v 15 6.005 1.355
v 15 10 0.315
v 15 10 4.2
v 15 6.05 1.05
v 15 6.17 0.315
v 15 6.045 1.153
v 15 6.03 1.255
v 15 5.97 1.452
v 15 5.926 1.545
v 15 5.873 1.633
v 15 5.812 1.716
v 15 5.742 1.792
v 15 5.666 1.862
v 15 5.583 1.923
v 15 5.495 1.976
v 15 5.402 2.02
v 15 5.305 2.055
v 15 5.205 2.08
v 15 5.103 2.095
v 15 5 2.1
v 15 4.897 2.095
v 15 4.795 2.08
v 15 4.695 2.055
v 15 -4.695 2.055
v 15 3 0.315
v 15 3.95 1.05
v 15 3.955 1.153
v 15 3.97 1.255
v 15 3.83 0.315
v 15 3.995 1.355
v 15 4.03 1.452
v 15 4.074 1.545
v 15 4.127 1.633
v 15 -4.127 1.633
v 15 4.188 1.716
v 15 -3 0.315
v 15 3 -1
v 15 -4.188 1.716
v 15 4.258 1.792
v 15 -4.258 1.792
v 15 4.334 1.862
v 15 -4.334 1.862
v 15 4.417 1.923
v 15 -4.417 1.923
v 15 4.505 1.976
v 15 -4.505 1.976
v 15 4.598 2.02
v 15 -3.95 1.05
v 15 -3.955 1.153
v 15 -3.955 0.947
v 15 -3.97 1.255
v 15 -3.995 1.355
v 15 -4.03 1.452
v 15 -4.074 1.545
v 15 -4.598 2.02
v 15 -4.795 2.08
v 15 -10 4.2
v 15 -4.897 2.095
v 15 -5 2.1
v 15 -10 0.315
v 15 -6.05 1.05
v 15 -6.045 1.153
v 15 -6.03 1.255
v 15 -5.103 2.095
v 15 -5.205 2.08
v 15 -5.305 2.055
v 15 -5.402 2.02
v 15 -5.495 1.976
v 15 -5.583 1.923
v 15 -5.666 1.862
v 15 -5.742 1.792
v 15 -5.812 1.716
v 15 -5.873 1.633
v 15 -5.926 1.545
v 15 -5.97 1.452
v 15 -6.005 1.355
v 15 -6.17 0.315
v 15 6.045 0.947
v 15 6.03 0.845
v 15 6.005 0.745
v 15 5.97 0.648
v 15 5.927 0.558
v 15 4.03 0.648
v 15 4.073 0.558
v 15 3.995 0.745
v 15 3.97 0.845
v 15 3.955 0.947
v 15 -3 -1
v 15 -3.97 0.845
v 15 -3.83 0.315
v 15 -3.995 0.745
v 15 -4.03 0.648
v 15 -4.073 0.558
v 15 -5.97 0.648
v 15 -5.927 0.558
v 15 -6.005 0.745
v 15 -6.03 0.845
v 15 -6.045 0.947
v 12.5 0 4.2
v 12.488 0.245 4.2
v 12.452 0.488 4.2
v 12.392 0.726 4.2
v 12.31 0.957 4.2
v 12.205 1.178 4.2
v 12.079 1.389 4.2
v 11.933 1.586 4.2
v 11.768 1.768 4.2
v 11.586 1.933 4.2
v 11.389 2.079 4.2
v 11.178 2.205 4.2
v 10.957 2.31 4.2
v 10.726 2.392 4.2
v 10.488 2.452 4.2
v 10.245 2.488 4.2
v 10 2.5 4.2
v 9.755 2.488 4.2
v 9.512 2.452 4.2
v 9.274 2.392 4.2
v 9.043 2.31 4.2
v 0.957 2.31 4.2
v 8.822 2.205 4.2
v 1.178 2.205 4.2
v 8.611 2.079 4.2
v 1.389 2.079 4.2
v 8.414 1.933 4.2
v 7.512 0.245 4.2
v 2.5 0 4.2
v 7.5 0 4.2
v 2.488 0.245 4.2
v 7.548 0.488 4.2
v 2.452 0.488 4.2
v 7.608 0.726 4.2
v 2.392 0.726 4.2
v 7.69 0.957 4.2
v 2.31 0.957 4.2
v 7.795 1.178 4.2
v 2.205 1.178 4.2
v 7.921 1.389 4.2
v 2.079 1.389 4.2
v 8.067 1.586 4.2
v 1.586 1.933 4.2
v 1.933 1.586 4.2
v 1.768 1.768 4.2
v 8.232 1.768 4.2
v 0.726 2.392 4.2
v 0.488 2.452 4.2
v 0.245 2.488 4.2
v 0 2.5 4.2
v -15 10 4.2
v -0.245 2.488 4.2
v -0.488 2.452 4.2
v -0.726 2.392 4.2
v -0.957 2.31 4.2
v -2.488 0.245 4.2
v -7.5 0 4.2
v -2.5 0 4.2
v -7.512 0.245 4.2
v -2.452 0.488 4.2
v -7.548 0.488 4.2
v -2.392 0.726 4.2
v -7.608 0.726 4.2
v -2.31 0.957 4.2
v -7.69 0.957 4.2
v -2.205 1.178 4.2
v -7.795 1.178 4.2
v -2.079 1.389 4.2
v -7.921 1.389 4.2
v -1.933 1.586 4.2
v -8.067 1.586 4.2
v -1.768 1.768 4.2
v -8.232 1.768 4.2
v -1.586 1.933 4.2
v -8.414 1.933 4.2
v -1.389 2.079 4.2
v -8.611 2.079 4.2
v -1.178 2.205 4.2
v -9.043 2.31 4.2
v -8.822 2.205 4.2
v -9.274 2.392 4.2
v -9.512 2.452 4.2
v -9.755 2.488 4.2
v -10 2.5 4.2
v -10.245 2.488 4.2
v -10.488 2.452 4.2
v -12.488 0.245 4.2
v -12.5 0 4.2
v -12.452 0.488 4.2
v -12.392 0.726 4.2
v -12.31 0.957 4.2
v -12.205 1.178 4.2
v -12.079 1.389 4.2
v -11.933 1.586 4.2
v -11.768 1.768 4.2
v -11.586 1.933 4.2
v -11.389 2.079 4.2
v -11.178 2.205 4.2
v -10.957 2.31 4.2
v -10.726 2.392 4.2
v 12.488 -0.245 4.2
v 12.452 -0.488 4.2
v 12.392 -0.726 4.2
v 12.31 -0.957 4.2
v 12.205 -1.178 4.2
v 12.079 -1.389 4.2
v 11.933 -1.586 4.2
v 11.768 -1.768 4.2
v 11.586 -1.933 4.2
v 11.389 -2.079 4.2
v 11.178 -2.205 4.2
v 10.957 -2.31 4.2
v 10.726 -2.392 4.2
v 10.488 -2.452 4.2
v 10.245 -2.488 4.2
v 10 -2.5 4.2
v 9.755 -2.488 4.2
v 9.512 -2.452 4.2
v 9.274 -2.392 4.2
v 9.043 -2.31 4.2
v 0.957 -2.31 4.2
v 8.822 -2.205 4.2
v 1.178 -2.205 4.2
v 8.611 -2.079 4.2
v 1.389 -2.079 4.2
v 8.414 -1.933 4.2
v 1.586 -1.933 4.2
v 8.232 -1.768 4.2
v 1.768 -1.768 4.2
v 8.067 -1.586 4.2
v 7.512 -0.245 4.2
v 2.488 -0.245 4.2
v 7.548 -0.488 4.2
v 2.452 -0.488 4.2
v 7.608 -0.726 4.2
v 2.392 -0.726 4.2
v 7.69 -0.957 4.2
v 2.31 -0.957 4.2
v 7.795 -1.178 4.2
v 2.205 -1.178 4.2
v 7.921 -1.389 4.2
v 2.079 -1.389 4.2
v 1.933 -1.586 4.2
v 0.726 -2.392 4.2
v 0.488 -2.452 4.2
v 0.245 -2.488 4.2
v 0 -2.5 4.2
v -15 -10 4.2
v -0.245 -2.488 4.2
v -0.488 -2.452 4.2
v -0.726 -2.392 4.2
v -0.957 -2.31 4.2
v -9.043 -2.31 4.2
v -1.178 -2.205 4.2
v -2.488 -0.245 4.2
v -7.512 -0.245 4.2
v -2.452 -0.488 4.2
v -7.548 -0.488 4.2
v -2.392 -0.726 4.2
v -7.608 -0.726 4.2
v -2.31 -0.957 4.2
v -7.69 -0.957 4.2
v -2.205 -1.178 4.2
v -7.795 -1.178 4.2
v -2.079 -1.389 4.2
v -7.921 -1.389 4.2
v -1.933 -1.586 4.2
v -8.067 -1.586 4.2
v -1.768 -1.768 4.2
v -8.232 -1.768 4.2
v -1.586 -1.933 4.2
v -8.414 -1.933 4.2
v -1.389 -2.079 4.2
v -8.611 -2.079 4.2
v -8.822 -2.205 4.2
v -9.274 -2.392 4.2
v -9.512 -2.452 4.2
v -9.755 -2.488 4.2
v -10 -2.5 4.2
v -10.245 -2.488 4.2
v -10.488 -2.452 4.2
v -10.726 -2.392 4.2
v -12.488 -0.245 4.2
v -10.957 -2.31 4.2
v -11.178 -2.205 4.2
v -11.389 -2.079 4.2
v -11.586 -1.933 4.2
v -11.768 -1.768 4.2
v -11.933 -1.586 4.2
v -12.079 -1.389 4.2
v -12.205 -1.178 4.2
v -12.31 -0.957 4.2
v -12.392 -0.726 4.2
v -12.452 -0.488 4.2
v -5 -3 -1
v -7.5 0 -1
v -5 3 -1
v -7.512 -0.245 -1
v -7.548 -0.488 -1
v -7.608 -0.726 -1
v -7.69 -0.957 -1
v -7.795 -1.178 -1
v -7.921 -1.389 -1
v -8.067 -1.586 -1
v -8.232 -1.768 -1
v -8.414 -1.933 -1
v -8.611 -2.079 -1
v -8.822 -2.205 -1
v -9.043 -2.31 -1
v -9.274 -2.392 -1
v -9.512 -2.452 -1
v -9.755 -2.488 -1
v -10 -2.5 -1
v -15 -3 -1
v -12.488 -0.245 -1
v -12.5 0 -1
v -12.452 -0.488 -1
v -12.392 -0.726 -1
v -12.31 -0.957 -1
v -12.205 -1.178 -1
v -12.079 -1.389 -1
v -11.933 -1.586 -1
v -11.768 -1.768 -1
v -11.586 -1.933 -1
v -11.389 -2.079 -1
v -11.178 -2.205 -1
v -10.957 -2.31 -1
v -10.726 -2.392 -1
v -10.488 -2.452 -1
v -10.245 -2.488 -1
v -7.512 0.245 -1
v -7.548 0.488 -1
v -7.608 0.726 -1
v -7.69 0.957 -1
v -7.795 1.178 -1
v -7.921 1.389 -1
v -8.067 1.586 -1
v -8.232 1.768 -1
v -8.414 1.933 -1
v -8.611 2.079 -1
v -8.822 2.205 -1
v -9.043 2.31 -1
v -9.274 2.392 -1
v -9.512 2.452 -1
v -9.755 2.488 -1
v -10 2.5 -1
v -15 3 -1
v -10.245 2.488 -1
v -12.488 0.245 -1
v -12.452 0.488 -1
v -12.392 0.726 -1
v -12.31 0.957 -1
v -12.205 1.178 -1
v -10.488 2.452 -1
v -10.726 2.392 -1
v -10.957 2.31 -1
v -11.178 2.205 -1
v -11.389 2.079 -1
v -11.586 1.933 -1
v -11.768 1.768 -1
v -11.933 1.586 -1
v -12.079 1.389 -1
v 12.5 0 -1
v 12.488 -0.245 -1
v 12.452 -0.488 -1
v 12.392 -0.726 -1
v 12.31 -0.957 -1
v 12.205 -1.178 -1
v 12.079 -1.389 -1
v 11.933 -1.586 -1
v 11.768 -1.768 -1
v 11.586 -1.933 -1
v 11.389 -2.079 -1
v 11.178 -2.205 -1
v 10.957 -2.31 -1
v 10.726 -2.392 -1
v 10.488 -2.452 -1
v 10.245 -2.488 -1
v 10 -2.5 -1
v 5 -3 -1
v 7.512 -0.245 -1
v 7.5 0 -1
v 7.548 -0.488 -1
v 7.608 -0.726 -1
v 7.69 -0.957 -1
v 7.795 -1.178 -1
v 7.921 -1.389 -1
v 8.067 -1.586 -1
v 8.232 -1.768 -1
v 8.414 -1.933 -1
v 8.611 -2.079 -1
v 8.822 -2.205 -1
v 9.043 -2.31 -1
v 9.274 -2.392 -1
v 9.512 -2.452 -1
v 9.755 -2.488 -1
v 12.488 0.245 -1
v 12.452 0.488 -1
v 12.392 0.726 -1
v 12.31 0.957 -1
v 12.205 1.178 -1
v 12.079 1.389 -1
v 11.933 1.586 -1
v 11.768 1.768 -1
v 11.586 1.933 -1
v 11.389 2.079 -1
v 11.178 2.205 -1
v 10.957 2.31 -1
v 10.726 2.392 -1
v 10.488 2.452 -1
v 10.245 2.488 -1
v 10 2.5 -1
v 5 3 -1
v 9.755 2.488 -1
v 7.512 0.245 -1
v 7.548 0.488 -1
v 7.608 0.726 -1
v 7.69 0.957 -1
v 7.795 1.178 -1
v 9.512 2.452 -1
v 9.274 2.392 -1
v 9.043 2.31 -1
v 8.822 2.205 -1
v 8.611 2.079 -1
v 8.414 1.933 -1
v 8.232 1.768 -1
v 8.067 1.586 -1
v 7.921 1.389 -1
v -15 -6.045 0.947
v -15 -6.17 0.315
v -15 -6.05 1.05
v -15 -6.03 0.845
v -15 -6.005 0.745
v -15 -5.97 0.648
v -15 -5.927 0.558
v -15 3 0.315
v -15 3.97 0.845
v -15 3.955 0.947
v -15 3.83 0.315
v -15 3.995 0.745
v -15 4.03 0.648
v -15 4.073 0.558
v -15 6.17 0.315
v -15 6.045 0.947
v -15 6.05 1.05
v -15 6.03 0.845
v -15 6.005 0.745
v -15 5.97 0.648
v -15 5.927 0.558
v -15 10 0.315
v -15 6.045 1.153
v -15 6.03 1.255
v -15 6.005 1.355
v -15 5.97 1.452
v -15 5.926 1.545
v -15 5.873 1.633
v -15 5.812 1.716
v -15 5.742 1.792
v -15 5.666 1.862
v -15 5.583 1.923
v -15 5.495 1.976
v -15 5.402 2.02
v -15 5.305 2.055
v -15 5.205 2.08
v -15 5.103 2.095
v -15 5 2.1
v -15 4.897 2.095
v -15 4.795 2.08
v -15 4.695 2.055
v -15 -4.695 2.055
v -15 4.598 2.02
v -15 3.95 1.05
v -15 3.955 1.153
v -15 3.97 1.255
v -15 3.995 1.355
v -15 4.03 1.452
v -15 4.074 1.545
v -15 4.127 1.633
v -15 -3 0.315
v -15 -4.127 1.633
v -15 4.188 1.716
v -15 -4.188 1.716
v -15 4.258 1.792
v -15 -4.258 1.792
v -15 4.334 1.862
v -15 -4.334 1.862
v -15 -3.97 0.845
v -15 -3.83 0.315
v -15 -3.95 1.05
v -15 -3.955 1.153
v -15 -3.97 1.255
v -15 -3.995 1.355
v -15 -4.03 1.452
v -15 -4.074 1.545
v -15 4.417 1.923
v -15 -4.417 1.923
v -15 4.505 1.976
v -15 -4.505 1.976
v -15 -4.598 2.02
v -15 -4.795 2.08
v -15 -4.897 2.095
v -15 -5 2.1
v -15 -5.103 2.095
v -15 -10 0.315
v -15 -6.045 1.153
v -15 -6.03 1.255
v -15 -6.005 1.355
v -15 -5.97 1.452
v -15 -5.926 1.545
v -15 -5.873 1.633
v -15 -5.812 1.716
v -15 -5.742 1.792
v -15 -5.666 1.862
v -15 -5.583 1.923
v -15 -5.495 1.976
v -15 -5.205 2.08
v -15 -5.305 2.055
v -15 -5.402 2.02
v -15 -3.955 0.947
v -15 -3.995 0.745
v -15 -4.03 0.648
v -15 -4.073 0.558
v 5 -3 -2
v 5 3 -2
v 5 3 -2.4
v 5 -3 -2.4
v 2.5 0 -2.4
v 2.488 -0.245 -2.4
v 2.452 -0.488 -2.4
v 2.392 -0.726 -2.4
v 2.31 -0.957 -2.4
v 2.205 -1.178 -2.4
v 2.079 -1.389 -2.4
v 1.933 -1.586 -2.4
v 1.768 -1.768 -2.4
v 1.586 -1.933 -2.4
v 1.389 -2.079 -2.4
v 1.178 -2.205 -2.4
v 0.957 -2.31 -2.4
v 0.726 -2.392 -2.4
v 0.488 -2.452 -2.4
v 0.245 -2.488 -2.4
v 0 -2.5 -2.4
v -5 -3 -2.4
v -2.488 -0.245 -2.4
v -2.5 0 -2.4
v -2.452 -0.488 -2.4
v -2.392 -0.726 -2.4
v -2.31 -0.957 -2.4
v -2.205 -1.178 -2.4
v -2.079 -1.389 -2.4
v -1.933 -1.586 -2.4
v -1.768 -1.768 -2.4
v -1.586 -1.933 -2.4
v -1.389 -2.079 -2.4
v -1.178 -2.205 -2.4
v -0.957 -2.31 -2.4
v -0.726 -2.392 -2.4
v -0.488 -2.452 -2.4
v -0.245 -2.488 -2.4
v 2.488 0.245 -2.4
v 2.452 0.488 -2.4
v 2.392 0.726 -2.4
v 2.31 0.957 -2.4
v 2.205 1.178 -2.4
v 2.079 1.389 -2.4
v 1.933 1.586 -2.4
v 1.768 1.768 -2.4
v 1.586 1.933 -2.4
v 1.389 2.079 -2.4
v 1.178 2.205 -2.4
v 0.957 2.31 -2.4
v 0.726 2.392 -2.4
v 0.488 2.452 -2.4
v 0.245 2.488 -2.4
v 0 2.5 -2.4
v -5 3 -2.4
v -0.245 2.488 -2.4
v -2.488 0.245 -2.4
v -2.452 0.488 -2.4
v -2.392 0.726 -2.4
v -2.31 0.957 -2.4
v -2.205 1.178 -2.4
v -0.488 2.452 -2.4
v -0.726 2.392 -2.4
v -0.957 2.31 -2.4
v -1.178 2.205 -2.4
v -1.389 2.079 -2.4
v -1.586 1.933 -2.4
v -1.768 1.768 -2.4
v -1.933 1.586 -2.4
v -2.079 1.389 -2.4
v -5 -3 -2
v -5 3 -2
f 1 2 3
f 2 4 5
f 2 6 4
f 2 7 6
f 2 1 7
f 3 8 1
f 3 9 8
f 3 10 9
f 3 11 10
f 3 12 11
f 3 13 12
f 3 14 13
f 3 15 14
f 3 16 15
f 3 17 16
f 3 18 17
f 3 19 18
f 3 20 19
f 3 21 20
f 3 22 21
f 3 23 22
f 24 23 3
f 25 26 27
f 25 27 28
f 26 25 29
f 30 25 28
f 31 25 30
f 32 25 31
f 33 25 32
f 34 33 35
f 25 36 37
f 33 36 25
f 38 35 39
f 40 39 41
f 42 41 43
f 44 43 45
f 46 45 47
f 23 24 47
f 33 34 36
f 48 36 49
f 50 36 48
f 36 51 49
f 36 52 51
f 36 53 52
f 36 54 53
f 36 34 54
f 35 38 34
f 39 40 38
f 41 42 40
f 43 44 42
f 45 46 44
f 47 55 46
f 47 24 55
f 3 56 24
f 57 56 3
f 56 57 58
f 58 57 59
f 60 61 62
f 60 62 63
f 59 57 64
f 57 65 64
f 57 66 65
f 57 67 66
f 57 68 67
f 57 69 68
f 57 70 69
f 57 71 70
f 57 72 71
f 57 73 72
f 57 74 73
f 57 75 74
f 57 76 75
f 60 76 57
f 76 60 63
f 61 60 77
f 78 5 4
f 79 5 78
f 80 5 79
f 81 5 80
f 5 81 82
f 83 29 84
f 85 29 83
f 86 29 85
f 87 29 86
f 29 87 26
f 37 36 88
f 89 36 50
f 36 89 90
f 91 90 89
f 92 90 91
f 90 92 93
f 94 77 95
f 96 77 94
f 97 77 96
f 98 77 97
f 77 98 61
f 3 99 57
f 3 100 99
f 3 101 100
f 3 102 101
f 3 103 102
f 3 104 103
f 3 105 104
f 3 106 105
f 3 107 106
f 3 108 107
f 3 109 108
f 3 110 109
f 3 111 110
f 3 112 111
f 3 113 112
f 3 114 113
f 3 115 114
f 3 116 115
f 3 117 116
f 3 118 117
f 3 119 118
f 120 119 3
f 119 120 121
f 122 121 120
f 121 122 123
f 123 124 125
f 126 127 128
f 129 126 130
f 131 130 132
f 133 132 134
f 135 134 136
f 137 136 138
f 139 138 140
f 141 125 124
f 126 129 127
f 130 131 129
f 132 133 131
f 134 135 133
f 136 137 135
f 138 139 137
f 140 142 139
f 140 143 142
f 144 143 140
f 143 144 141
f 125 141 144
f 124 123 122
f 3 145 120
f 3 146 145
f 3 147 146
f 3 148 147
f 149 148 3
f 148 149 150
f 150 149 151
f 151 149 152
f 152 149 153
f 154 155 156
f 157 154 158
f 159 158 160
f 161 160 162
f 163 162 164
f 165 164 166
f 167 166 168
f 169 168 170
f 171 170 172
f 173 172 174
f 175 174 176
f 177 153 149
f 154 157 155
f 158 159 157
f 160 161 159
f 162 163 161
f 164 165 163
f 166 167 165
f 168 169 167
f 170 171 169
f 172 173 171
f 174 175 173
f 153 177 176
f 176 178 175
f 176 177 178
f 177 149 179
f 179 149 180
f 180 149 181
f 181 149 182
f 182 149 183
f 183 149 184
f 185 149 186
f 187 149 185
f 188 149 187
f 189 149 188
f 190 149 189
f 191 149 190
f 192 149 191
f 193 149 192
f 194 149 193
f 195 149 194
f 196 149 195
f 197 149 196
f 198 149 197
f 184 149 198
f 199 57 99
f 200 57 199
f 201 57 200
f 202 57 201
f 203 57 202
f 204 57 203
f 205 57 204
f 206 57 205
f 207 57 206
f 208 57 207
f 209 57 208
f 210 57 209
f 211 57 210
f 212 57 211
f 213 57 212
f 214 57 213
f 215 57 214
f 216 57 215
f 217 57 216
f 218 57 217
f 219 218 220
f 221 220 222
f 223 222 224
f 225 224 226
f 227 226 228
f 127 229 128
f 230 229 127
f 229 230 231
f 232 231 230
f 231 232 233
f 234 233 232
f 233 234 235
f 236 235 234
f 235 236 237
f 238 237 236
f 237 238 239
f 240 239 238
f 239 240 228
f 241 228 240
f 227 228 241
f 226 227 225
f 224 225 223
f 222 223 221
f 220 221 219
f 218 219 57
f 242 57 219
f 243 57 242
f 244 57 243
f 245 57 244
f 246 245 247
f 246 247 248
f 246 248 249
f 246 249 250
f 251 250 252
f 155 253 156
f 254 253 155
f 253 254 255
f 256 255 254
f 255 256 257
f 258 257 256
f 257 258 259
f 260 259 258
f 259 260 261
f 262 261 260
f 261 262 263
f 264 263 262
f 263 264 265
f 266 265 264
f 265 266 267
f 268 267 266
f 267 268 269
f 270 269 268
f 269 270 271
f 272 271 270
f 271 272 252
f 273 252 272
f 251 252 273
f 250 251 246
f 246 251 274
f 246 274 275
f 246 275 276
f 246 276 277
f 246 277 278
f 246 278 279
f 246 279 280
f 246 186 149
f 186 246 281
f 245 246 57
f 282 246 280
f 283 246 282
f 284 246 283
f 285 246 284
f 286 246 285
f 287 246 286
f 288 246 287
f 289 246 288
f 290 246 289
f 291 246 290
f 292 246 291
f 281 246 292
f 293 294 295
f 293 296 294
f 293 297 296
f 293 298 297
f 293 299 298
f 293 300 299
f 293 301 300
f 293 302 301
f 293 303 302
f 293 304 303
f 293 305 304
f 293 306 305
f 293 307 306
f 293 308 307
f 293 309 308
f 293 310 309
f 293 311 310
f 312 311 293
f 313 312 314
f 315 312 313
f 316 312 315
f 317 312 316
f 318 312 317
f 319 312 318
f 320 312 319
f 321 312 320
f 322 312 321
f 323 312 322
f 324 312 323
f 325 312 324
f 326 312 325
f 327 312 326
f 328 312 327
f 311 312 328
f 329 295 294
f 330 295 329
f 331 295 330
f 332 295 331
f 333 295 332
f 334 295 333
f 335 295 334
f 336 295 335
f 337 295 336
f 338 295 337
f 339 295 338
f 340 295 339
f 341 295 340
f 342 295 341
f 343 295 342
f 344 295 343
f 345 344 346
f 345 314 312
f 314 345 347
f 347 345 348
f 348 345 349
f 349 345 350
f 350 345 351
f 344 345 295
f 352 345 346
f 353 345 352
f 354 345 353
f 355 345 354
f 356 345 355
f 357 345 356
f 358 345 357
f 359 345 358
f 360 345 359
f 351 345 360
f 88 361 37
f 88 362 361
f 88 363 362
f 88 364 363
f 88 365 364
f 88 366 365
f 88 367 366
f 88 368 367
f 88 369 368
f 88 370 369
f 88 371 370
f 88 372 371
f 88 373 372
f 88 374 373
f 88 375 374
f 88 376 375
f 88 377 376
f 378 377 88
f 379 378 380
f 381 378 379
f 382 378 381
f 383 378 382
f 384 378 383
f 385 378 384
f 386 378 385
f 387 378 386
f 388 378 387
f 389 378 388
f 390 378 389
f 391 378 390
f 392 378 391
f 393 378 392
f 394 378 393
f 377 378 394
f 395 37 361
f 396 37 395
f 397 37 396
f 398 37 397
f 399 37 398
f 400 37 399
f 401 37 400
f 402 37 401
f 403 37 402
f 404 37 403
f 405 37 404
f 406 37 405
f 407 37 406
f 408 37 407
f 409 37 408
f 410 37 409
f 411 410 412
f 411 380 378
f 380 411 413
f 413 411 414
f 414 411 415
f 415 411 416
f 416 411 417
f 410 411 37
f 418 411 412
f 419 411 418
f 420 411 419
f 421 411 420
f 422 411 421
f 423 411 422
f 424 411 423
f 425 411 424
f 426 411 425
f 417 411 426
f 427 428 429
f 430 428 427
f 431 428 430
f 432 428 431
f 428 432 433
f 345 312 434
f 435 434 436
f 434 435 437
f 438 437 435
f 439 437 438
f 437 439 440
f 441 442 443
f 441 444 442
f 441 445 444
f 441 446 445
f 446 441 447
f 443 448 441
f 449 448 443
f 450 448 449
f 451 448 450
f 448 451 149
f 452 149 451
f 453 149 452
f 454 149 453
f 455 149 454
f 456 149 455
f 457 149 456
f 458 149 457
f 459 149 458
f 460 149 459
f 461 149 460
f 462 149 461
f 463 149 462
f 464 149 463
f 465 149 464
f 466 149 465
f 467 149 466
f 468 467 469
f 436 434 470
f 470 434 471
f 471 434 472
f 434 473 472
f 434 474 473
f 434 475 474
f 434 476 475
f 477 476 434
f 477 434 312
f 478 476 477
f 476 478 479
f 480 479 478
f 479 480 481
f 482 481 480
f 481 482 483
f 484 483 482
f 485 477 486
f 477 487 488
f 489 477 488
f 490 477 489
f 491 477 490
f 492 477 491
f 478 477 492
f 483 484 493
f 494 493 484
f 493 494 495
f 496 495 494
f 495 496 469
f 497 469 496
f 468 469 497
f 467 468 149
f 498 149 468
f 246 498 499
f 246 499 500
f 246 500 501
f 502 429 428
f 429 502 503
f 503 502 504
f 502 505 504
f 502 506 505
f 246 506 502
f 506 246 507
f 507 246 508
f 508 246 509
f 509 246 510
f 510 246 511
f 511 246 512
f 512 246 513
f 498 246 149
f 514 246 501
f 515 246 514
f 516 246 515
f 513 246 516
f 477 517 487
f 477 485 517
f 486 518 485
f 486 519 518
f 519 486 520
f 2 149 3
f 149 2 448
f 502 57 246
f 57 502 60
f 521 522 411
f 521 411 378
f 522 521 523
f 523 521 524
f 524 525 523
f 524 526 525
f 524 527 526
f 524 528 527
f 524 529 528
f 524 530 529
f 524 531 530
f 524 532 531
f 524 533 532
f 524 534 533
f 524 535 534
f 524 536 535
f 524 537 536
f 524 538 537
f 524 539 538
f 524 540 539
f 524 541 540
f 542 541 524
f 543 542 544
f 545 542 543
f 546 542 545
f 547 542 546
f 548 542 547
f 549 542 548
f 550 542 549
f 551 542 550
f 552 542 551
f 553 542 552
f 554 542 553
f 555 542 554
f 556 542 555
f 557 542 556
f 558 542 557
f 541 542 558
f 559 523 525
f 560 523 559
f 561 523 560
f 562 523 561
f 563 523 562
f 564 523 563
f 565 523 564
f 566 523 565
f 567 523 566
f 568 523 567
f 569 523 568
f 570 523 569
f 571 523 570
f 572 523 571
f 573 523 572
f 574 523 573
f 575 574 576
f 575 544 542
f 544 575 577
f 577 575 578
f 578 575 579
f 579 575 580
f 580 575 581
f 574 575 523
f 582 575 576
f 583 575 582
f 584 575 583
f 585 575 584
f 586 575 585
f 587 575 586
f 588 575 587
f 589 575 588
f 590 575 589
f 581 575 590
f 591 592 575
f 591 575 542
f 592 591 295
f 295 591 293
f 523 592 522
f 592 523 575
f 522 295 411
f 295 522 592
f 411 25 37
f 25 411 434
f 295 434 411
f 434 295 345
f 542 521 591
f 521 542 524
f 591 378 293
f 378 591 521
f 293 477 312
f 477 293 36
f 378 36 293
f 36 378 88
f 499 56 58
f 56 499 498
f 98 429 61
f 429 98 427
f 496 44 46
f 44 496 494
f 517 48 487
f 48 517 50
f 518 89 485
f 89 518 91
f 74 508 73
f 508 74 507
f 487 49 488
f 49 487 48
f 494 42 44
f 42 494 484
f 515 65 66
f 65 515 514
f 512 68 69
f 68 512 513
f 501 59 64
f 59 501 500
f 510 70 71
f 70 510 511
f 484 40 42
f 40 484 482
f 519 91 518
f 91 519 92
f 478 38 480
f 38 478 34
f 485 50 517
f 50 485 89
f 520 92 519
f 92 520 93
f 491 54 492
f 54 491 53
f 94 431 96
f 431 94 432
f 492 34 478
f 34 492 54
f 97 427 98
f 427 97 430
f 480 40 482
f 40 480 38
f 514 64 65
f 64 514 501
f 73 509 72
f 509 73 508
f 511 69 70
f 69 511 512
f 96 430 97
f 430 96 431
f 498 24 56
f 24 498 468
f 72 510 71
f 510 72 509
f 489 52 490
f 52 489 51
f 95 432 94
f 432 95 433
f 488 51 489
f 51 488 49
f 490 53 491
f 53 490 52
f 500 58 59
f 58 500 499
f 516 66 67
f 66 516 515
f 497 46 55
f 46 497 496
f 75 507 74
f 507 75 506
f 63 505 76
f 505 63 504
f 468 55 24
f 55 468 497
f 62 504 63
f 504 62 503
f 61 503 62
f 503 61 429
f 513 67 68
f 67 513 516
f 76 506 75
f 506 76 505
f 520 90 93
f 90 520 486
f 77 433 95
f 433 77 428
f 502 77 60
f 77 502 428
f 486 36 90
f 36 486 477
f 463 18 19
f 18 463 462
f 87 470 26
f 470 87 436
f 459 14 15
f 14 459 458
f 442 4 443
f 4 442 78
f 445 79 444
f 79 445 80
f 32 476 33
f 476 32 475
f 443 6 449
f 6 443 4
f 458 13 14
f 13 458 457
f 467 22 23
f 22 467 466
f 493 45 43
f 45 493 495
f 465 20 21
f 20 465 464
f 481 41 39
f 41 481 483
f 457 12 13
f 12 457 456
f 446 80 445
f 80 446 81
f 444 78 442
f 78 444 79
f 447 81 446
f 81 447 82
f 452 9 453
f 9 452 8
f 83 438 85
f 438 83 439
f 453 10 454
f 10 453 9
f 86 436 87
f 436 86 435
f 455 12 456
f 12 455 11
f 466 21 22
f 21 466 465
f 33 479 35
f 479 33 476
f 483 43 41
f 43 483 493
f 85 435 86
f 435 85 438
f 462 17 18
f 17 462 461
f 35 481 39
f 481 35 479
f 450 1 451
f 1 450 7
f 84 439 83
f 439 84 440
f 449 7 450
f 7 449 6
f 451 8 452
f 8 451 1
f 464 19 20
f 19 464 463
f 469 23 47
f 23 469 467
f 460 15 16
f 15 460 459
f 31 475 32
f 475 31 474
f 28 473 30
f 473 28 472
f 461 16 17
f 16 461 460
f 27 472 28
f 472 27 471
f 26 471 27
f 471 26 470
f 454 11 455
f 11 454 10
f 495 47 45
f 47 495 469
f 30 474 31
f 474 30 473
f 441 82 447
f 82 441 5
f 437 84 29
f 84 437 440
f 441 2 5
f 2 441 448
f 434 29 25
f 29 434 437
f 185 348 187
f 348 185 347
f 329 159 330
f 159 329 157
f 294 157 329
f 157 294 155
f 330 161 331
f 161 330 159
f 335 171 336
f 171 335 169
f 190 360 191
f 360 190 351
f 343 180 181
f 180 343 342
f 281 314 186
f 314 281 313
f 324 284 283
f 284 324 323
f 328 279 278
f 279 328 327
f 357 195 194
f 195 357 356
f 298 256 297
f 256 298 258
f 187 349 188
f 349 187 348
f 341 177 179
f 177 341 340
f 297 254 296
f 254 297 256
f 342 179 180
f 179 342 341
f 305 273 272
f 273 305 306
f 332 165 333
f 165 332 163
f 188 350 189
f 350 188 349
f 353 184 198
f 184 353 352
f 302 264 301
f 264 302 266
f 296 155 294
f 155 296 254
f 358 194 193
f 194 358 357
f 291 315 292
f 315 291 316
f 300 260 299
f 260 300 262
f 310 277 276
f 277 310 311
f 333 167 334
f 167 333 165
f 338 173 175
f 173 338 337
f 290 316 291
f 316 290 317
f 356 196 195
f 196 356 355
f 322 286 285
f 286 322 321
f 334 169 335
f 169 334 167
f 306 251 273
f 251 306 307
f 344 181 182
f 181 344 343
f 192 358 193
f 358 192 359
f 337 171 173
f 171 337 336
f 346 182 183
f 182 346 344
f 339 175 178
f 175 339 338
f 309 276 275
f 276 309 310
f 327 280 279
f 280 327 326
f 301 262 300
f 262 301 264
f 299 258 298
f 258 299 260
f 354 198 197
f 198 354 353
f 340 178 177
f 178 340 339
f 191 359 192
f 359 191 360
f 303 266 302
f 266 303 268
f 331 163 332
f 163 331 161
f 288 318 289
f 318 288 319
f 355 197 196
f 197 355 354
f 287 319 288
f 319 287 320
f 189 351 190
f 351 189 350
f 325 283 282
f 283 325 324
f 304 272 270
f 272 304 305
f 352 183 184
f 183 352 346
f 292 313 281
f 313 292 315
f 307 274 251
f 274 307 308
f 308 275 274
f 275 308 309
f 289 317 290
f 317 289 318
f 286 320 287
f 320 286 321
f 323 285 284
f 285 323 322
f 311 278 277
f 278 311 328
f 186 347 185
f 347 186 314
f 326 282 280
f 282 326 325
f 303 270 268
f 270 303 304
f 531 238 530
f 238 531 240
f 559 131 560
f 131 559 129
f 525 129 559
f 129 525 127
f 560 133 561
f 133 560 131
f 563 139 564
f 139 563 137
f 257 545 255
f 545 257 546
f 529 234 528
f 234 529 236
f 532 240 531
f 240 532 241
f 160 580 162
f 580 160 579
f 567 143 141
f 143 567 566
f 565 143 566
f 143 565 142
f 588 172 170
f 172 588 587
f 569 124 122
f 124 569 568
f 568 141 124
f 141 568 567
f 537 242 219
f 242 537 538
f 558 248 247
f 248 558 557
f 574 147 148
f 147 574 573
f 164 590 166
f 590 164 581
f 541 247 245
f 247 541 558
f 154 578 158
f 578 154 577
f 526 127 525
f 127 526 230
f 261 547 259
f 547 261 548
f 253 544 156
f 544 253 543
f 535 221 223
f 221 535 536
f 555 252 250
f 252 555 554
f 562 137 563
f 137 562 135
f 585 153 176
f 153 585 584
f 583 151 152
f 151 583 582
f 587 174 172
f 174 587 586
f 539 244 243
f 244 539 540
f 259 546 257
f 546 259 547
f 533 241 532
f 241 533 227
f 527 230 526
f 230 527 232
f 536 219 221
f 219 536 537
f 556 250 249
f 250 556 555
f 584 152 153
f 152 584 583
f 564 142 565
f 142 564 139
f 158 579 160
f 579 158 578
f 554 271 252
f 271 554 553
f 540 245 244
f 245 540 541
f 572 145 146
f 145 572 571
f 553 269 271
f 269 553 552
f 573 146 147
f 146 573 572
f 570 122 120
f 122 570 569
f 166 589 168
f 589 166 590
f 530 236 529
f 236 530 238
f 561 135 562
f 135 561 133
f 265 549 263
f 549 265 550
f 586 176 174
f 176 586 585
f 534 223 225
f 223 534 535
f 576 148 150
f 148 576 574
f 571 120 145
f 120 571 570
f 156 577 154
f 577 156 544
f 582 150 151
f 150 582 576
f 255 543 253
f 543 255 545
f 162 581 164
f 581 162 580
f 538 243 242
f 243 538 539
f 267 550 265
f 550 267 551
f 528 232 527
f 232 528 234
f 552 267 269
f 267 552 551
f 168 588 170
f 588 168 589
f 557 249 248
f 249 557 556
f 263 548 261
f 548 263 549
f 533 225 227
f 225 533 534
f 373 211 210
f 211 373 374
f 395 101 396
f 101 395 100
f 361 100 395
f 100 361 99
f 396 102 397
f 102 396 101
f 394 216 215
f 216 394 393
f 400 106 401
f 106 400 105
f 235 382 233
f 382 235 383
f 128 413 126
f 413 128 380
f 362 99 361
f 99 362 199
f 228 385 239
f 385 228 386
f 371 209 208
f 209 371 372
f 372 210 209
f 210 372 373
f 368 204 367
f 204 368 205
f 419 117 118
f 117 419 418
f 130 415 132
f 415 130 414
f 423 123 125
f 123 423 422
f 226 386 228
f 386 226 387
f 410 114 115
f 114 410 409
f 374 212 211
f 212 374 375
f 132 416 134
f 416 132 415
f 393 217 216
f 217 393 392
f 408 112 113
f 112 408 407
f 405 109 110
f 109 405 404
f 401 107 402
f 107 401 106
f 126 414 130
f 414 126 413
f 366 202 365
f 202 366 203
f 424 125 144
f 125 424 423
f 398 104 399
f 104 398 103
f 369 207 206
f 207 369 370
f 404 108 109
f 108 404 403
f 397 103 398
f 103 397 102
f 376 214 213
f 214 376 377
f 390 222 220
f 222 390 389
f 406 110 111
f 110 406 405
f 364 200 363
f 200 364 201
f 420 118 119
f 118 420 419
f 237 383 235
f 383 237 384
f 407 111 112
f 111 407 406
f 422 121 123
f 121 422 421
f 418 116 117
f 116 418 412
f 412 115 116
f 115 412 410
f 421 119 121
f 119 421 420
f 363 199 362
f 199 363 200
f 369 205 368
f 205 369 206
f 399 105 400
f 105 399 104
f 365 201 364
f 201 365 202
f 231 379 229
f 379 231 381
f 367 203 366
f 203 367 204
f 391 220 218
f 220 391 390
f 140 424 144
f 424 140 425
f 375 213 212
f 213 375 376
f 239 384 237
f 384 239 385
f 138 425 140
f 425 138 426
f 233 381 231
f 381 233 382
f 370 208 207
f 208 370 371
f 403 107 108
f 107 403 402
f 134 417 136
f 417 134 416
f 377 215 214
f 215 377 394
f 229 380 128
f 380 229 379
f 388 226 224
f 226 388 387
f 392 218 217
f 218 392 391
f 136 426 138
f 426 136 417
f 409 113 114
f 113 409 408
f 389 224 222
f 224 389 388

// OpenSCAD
// file: ../lib/t2020beam.scad
t2020_w = 20;
t2020_notch_w = 6;
t2020_notch_d = 6;
t2020_hole_ir = 5/2;

module t2020(length=100) {
    translate([0, 0, -length/2])
    linear_extrude(length) {
        difference() {
            square([t2020_w, t2020_w], center=true);
            for (i=[0:3]) {
                rotate([0, 0, 90 * i]) {
                    translate([t2020_w/2 - t2020_notch_d / 2, 0, 0]) {
                        square([t2020_notch_d, t2020_notch_w], center=true);
                    }
                }
            }
            circle(r=t2020_hole_ir);
        }
    }
}

module t2020_hole(length) {
    t2020(length);
    cube([t2020_w - 2, t2020_w - 2, length+1], center=true);
}
// main file
use <../lib/t2020beam.scad>;
/*
base_fn = 64;

marble_od = 16.2;
wire_od = 2.1;
// wire_pitch = 8.0;

// ring_od = 27;

th = 0.8;


// num_wires = 6;
// num_screws = 1;
// screw_od = 5;
// small_screw_od = 3;

// // screw_c_c = ring_id/2 - clr + wire_od + 10;

// // small_screw_c_c = (ring_id / 2 + screw_c_c) / 2 - th;
// small_screw_c_c = screw_c_c - screw_od - small_screw_od/2;



// wire_thetas = [0:90:360];
// echo(wire_thetas=wire_thetas);
// jig_inner_th = 5;
// jig_outer_th = 5;


jig_inner_or = marble_od/2 + wire_od * 1.5 - clr;
jig_outer_ir = jig_inner_or + clr; // marble_od/2 + wire_od/2;
jig_outer_or = jig_outer_ir + wire_od * 2; // marble_od/2 + wire_od * (1 + grip_ratio)

jig_loop_r = marble_od/2 + wire_od * 3/2;

// */

base_fn = 64;

marble_od = 16.2;
wire_od = 2.1;

// Ratio of height of circle to cover, leaving 1-grip_ratio of wire exposed
grip_ratio = 0.85;
// Total clearance between 2 parts (i.e. half each side if within)
clr = 0.4;

wire_thetas = [0:90:270];
ring_th = 4;

wire_pitch = marble_od/2 + wire_od;
out_ring_or = marble_od/2 + wire_od + ring_th;
out_ring_ir = wire_pitch - wire_od * grip_ratio/2 + clr;


/*

Design Criteria:
* Full circle (for strength)
* Use 4 wire holes
* Two main types: Outie and Innie


*/

module marble() {
    sphere(r=marble_od/2, $fn=base_fn*2);
}

// ! marble();


module wire(h=40) {
    cylinder(r=wire_od/2, h=h, $fn=base_fn/2, center=true);
}

// ! wire();



module wires(dr=0, h=40) {
    for (r=wire_thetas) {
        rotate([0, 0, r])
            translate([wire_pitch, 0, 0])
            wire(h=h);
    }
}

// ! wires();


module out_ring() {
    difference() {
        union() {
            cylinder(
                r=out_ring_or, 
                h=ring_th, center=true, $fn=base_fn);
        }
        wires();
        // for (r=wire_thetas) {
        //     rotate([0, 0, r + 45])
        //         translate([(out_ring_or + out_ring_ir) / 2, 0, 0])
        //         cylinder(r=3/2, h=ring_th + 1, center=true, $fn=base_fn/2);
        // }
        cylinder(
            r=out_ring_ir, 
            h=ring_th + 2, center=true, $fn=base_fn);
        // translate([jig_loop_r, 0, 0])
        //     cylinder(r=5/2, h=10, center=true, $fn=base_fn);
        // // translate([jig_loop_r + clr*2, 0, 0])
        // //     wire();
        // loop();
    }
}

// ! out_ring();


// module in_ring() {
//     difference() {
//         union() {
//             out_ring();
//         }
//         wires(h=50, dr=ring_th);
//         % wires(h=ring_th, dr=ring_th);
        
//     }
// }

// // ! in_ring();


// module rail() {
//     // % translate([marble_od/2 + wire_od/2, 0, 0]) 
//     //     in_ring();

//     difference() {
//         union() {
//             cylinder(r=wire_od/2, h=marble_od * 2.2, $fn=base_fn, center=true);
//             translate([-ring_th + wire_od / 1.25, 0, ring_th/2 + clr/2])
//                 cylinder(r1=wire_od, r2=wire_od/2, h=marble_od/2, $fn=base_fn/2, center=false);
//             translate([-ring_th + wire_od / 1.25, 0, -ring_th/2 - marble_od/2 - clr/2])
//                 cylinder(r2=wire_od, r1=wire_od/2, h=marble_od/2, $fn=base_fn/2, center=false);
//         }
//         translate([-ring_th, 0, ring_th/2])
//             rotate([0, 10, 0])
//             cylinder(r=wire_od/2, h=marble_od * 2 - ring_th/2, $fn=base_fn/2);


//         translate([-ring_th, 0, -ring_th/2])
//             rotate([0, 170, 0])
//             cylinder(r=wire_od/2, h=marble_od * 2 - ring_th/2, $fn=base_fn/2);
//     }

// }

// // ! rail();


// module rails(dr=0, h=40) {
//     for (r=wire_thetas) {
//         rotate([0, 0, r])
//             translate([-marble_od/2 - wire_od/2 - dr, 0, 0])
//             rail();
//     }
// }

// // ! rails();

guide_l = 30;
track_inside_w = 10;

module t2020_guide() {
    difference() {
        union() {
            translate([-guide_l/2, -10, -1])
                cube([guide_l, 20, 2 * wire_od + 1]);
            # translate([-(guide_l - 20)/2, -3, -2.4])
                cube([guide_l - 20, 6, 2 * wire_od + 0.6]);
        }

        for (i=[-1, 1]) {
            translate([0, i * track_inside_w / 2, wire_od/2])
                rotate([0, 90, 0])
                cylinder(r=wire_od/2, h=3 * guide_l, center=true, $fn=base_fn);
            translate([0, i * 5, 0])
                rotate([0, 90, 0])
                cylinder(r=wire_od/2 * sqrt(2), h=3 * guide_l, center=true, $fn=4);
            translate([-guide_l/2 - 1, (i > 0 ? 3 : -11), -2])
                cube([guide_l + 2, 8, 2 + wire_od * (1 - grip_ratio)]);
        }

        for (i=[-1, 0, 1]) {
            translate([i * (guide_l / 2 - 5), 0, 0])
                cylinder(r=5/2, h=10, center=true, $fn=base_fn);
        }
        
        
    }
}

! t2020_guide();


module design() {
    color("gray")
        translate([0, 0, -10])
        rotate([0, 90, 0])
        t2020(150);
    rotate([0, 0, 90])
    t2020_guide();
}

design();



module plate() {
    t2020_guide();
}

// ! plate();


/*

module loop() {
    rotate_extrude($fn=base_fn) {
        translate([jig_loop_r, 0, 0])
        circle(r=wire_od/2, $fn=base_fn/2);
    }
    // % translate([jig_loop_r, 0, 0])
    //     rotate([90, 0, 0])
    //     cylinder(r1=wire_od/2, r2=wire_od/2 + clr, h=marble_od, $fn=base_fn/2);
    // translate([-wire_od*2.5, 0, 0])
    //     rotate_extrude(angle=90, $fn=base_fn) {
    //     translate([jig_loop_r + wire_od * 2.5, 0, 0])
    //     circle(r=wire_od/2 + clr, $fn=base_fn/2);
    // }
}

// ! loop();

// module jig_inner() {
//     difference() {
//         union() {
//             cylinder(
//                 r=jig_inner_or - jig_inner_th/2, 
//                 h=jig_inner_th, center=true, $fn=base_fn);
//             rotate_extrude($fn=base_fn) {
//                 translate([jig_inner_or - jig_inner_th/2, 0, 0])
//                 circle(r=jig_inner_th/2, $fn=base_fn/2);
//             }
//         }
//         wires();
//         wires(dr=wire_od * grip_ratio);
//         loop();
//         cylinder(r=5/2, h=jig_inner_th + 1, center=true, $fn=base_fn/2);
//         translate([-clr/2, 0, -jig_inner_th/2-1])
//             cube([clr, jig_inner_or, jig_inner_th + 2]);
//     }
// }

// // ! jig_inner();





// module design2() {
//     // color([1, 0, 0, 0.75])
//         jig_inner();
//     // color([0, 1, 0, 0.75])
//         jig_outer();
//     *% marble();
// }

// design2();

// module cutaway() {
//     difference() {
//         design2();
//         cube([100, 100, 100]);
//     }
// }

// // ! cutaway();

// module plate() {
//     translate([0, 0, jig_inner_th/2])
//         jig_inner();
//     translate([marble_od * 1.5 + wire_od * 2, 0, jig_outer_th/2])
//         jig_outer();
// }

// ! plate();

module wire3(h=40) {
    cylinder(r=wire_od/2, h=h, $fn=base_fn/2, center=true);
}

// module jig_inner3() {
//     difference() {
//         union() {
//             cylinder(
//                 r=jig_inner_or - jig_inner_th/2, 
//                 h=jig_inner_th, center=true, $fn=base_fn);
//             rotate_extrude($fn=base_fn) {
//                 translate([jig_inner_or - jig_inner_th/2, 0, 0])
//                 circle(r=jig_inner_th/2, $fn=base_fn/2);
//             }
//         }
//         wires();
//         wires(dr=wire_od * grip_ratio);
//         loop();
//         cylinder(r=5/2, h=jig_inner_th + 1, center=true, $fn=base_fn/2);
//         * translate([-clr/2, 0, -jig_inner_th/2-1])
//             cube([clr, jig_inner_or, jig_inner_th + 2]);
//     }
// }

// // ! jig_inner3();

spacer_th = 2;
spacer_ir = marble_od/2 + clr;
spacer_or = spacer_ir + 5; // marble_od/2 + wire_od/2;
wire_bend_r = 10;

module spacer_outside() {
    difference() {
        cylinder(h=spacer_th, r=spacer_or, center=true, $fn=base_fn);
        cylinder(h=spacer_th + 1, r=spacer_ir, center=true, $fn=base_fn);
        wires();
    }
}
// ! spacer_outside();


module spacer_inside() {
    difference() {
        cylinder(h=spacer_th, r=spacer_ir + 1, center=true, $fn=base_fn);
        cylinder(h=spacer_th + 1, r=spacer_ir, center=true, $fn=base_fn);
        wires();
    }
}
// ! spacer_inside();


module design3() {
    for (i=[-1, 1]) {
        translate([0, 0, i * marble_od])
            spacer_outside();
    }
    spacer_inside();
    % marble();
    % wires();
}

// design3();

module cutaway() {
    difference() {
        design2();
        cube([100, 100, 100]);
    }
}

// ! cutaway();

module plate() {
    translate([0, 0, jig_inner_th/2])
        jig_inner();
    translate([marble_od * 1.5 + wire_od * 2, 0, jig_outer_th/2])
        jig_outer();
}

// ! plate();



// // module ring() {
// //     difference() {
// //         union() {
// //             cylinder(r=ring_od/2, h=ring_th, center=true, $fn=base_fn);
// //             for (r=[0:360/num_wires:360 * num_screws / num_wires - 1]) {
// //                 rotate([0, 0, r + 180/num_wires]) {
// //                     translate([screw_c_c, 0, 0]) {
// //                         cylinder(r=5, h=ring_th, center=true, $fn=base_fn);    
// //                     }
// //                     translate([small_screw_c_c, 0, 0]) {
// //                         cylinder(r=5, h=ring_th, center=true, $fn=base_fn);    
// //                     }
// //                 }
// //             }
// //         }
// //         cylinder(r=ring_id/2, h=ring_th + 1, center=true, $fn=base_fn);
// //         cylinder(r1=ring_id/2, r2=ring_id/2 + th, h=ring_th/2 + 0.01, center=false, $fn=base_fn);
// //         union() {
// //             for (r=[0:360/num_wires:360]) {
// //                 rotate([0, 0, r])
// //                     translate([ring_id/2 + wire_od/2 + th, 0, -ring_th - 1])
// //                     cylinder(r=wire_od/2, h=10, $fn=base_fn);

// //                 rotate([0, 0, r + 7])
// //                     translate([ring_id/2 + wire_od/2 + th + clr/2, 0, -ring_th - 1])
// //                     cylinder(r=wire_od/2 + clr/2, h=10, $fn=base_fn);
// //                 rotate([0, 0, r + 14])
// //                     translate([ring_id/2 + th, 0, -ring_th - 1])
// //                     cylinder(r=wire_od/2 + clr/2, h=10, $fn=base_fn);
// //             }
            
// //             for (r=[0:360/num_wires:360]) {
// //                  rotate([0, 0, r])
// //                 translate([ring_id/2, 0, 0])
// //                     rotate([0, 0, 2])
// //                         translate([-marble_od/2, 0, 0])
// //                         cylinder(r=marble_od/2, h=ring_th*3, center=true, $fn=base_fn);
            
// //             }
// //             for (r=[0:360/num_wires:360 * num_screws / num_wires - 1]) {
// //                 rotate([0, 0, r + 180/num_wires]) {
// //                     translate([screw_c_c, 0, 0]) {
// //                         cylinder(r=screw_od/2, h=ring_th + 1, center=true, $fn=base_fn);    
// //                     }
// //                     translate([small_screw_c_c, 0, 0]) {
// //                         cylinder(r=small_screw_od/2, h=ring_th + 1, center=true, $fn=base_fn);    
// //                     }
// //                 }
// //             }
// //         }
// //     }

// // }

// // ! ring();

// module beam(l) {
//     translate([0, -l/2, 0])
//         cube([10, l, 10]);
//     translate([-10, -l/2, -10])
//         cube([10, l, 10]);
//     cube([20, l, 20], center=true);
// }

// // module design() {
// //     // % marble();
// //     color([0, 0, 1, 1])
// //         ring();
// //     % color([0, 1, 0, 0.5])
// //         translate([0, 0, -ring_th])
// //         rotate([180, 0, 360/num_wires])
// //         ring();

// //     % translate([ring_id/2 - marble_od/2, ring_id/2 - marble_od/2, 0])
// //         marble();
// //     // * translate([-3, 0, marble_od/2])
// //         // marble();
    

// //     * % rotate([0, 0, 180/num_wires])
// //         translate([screw_c_c, 0, 0])
// //         beam(60);
// // }

// // design();

// */
